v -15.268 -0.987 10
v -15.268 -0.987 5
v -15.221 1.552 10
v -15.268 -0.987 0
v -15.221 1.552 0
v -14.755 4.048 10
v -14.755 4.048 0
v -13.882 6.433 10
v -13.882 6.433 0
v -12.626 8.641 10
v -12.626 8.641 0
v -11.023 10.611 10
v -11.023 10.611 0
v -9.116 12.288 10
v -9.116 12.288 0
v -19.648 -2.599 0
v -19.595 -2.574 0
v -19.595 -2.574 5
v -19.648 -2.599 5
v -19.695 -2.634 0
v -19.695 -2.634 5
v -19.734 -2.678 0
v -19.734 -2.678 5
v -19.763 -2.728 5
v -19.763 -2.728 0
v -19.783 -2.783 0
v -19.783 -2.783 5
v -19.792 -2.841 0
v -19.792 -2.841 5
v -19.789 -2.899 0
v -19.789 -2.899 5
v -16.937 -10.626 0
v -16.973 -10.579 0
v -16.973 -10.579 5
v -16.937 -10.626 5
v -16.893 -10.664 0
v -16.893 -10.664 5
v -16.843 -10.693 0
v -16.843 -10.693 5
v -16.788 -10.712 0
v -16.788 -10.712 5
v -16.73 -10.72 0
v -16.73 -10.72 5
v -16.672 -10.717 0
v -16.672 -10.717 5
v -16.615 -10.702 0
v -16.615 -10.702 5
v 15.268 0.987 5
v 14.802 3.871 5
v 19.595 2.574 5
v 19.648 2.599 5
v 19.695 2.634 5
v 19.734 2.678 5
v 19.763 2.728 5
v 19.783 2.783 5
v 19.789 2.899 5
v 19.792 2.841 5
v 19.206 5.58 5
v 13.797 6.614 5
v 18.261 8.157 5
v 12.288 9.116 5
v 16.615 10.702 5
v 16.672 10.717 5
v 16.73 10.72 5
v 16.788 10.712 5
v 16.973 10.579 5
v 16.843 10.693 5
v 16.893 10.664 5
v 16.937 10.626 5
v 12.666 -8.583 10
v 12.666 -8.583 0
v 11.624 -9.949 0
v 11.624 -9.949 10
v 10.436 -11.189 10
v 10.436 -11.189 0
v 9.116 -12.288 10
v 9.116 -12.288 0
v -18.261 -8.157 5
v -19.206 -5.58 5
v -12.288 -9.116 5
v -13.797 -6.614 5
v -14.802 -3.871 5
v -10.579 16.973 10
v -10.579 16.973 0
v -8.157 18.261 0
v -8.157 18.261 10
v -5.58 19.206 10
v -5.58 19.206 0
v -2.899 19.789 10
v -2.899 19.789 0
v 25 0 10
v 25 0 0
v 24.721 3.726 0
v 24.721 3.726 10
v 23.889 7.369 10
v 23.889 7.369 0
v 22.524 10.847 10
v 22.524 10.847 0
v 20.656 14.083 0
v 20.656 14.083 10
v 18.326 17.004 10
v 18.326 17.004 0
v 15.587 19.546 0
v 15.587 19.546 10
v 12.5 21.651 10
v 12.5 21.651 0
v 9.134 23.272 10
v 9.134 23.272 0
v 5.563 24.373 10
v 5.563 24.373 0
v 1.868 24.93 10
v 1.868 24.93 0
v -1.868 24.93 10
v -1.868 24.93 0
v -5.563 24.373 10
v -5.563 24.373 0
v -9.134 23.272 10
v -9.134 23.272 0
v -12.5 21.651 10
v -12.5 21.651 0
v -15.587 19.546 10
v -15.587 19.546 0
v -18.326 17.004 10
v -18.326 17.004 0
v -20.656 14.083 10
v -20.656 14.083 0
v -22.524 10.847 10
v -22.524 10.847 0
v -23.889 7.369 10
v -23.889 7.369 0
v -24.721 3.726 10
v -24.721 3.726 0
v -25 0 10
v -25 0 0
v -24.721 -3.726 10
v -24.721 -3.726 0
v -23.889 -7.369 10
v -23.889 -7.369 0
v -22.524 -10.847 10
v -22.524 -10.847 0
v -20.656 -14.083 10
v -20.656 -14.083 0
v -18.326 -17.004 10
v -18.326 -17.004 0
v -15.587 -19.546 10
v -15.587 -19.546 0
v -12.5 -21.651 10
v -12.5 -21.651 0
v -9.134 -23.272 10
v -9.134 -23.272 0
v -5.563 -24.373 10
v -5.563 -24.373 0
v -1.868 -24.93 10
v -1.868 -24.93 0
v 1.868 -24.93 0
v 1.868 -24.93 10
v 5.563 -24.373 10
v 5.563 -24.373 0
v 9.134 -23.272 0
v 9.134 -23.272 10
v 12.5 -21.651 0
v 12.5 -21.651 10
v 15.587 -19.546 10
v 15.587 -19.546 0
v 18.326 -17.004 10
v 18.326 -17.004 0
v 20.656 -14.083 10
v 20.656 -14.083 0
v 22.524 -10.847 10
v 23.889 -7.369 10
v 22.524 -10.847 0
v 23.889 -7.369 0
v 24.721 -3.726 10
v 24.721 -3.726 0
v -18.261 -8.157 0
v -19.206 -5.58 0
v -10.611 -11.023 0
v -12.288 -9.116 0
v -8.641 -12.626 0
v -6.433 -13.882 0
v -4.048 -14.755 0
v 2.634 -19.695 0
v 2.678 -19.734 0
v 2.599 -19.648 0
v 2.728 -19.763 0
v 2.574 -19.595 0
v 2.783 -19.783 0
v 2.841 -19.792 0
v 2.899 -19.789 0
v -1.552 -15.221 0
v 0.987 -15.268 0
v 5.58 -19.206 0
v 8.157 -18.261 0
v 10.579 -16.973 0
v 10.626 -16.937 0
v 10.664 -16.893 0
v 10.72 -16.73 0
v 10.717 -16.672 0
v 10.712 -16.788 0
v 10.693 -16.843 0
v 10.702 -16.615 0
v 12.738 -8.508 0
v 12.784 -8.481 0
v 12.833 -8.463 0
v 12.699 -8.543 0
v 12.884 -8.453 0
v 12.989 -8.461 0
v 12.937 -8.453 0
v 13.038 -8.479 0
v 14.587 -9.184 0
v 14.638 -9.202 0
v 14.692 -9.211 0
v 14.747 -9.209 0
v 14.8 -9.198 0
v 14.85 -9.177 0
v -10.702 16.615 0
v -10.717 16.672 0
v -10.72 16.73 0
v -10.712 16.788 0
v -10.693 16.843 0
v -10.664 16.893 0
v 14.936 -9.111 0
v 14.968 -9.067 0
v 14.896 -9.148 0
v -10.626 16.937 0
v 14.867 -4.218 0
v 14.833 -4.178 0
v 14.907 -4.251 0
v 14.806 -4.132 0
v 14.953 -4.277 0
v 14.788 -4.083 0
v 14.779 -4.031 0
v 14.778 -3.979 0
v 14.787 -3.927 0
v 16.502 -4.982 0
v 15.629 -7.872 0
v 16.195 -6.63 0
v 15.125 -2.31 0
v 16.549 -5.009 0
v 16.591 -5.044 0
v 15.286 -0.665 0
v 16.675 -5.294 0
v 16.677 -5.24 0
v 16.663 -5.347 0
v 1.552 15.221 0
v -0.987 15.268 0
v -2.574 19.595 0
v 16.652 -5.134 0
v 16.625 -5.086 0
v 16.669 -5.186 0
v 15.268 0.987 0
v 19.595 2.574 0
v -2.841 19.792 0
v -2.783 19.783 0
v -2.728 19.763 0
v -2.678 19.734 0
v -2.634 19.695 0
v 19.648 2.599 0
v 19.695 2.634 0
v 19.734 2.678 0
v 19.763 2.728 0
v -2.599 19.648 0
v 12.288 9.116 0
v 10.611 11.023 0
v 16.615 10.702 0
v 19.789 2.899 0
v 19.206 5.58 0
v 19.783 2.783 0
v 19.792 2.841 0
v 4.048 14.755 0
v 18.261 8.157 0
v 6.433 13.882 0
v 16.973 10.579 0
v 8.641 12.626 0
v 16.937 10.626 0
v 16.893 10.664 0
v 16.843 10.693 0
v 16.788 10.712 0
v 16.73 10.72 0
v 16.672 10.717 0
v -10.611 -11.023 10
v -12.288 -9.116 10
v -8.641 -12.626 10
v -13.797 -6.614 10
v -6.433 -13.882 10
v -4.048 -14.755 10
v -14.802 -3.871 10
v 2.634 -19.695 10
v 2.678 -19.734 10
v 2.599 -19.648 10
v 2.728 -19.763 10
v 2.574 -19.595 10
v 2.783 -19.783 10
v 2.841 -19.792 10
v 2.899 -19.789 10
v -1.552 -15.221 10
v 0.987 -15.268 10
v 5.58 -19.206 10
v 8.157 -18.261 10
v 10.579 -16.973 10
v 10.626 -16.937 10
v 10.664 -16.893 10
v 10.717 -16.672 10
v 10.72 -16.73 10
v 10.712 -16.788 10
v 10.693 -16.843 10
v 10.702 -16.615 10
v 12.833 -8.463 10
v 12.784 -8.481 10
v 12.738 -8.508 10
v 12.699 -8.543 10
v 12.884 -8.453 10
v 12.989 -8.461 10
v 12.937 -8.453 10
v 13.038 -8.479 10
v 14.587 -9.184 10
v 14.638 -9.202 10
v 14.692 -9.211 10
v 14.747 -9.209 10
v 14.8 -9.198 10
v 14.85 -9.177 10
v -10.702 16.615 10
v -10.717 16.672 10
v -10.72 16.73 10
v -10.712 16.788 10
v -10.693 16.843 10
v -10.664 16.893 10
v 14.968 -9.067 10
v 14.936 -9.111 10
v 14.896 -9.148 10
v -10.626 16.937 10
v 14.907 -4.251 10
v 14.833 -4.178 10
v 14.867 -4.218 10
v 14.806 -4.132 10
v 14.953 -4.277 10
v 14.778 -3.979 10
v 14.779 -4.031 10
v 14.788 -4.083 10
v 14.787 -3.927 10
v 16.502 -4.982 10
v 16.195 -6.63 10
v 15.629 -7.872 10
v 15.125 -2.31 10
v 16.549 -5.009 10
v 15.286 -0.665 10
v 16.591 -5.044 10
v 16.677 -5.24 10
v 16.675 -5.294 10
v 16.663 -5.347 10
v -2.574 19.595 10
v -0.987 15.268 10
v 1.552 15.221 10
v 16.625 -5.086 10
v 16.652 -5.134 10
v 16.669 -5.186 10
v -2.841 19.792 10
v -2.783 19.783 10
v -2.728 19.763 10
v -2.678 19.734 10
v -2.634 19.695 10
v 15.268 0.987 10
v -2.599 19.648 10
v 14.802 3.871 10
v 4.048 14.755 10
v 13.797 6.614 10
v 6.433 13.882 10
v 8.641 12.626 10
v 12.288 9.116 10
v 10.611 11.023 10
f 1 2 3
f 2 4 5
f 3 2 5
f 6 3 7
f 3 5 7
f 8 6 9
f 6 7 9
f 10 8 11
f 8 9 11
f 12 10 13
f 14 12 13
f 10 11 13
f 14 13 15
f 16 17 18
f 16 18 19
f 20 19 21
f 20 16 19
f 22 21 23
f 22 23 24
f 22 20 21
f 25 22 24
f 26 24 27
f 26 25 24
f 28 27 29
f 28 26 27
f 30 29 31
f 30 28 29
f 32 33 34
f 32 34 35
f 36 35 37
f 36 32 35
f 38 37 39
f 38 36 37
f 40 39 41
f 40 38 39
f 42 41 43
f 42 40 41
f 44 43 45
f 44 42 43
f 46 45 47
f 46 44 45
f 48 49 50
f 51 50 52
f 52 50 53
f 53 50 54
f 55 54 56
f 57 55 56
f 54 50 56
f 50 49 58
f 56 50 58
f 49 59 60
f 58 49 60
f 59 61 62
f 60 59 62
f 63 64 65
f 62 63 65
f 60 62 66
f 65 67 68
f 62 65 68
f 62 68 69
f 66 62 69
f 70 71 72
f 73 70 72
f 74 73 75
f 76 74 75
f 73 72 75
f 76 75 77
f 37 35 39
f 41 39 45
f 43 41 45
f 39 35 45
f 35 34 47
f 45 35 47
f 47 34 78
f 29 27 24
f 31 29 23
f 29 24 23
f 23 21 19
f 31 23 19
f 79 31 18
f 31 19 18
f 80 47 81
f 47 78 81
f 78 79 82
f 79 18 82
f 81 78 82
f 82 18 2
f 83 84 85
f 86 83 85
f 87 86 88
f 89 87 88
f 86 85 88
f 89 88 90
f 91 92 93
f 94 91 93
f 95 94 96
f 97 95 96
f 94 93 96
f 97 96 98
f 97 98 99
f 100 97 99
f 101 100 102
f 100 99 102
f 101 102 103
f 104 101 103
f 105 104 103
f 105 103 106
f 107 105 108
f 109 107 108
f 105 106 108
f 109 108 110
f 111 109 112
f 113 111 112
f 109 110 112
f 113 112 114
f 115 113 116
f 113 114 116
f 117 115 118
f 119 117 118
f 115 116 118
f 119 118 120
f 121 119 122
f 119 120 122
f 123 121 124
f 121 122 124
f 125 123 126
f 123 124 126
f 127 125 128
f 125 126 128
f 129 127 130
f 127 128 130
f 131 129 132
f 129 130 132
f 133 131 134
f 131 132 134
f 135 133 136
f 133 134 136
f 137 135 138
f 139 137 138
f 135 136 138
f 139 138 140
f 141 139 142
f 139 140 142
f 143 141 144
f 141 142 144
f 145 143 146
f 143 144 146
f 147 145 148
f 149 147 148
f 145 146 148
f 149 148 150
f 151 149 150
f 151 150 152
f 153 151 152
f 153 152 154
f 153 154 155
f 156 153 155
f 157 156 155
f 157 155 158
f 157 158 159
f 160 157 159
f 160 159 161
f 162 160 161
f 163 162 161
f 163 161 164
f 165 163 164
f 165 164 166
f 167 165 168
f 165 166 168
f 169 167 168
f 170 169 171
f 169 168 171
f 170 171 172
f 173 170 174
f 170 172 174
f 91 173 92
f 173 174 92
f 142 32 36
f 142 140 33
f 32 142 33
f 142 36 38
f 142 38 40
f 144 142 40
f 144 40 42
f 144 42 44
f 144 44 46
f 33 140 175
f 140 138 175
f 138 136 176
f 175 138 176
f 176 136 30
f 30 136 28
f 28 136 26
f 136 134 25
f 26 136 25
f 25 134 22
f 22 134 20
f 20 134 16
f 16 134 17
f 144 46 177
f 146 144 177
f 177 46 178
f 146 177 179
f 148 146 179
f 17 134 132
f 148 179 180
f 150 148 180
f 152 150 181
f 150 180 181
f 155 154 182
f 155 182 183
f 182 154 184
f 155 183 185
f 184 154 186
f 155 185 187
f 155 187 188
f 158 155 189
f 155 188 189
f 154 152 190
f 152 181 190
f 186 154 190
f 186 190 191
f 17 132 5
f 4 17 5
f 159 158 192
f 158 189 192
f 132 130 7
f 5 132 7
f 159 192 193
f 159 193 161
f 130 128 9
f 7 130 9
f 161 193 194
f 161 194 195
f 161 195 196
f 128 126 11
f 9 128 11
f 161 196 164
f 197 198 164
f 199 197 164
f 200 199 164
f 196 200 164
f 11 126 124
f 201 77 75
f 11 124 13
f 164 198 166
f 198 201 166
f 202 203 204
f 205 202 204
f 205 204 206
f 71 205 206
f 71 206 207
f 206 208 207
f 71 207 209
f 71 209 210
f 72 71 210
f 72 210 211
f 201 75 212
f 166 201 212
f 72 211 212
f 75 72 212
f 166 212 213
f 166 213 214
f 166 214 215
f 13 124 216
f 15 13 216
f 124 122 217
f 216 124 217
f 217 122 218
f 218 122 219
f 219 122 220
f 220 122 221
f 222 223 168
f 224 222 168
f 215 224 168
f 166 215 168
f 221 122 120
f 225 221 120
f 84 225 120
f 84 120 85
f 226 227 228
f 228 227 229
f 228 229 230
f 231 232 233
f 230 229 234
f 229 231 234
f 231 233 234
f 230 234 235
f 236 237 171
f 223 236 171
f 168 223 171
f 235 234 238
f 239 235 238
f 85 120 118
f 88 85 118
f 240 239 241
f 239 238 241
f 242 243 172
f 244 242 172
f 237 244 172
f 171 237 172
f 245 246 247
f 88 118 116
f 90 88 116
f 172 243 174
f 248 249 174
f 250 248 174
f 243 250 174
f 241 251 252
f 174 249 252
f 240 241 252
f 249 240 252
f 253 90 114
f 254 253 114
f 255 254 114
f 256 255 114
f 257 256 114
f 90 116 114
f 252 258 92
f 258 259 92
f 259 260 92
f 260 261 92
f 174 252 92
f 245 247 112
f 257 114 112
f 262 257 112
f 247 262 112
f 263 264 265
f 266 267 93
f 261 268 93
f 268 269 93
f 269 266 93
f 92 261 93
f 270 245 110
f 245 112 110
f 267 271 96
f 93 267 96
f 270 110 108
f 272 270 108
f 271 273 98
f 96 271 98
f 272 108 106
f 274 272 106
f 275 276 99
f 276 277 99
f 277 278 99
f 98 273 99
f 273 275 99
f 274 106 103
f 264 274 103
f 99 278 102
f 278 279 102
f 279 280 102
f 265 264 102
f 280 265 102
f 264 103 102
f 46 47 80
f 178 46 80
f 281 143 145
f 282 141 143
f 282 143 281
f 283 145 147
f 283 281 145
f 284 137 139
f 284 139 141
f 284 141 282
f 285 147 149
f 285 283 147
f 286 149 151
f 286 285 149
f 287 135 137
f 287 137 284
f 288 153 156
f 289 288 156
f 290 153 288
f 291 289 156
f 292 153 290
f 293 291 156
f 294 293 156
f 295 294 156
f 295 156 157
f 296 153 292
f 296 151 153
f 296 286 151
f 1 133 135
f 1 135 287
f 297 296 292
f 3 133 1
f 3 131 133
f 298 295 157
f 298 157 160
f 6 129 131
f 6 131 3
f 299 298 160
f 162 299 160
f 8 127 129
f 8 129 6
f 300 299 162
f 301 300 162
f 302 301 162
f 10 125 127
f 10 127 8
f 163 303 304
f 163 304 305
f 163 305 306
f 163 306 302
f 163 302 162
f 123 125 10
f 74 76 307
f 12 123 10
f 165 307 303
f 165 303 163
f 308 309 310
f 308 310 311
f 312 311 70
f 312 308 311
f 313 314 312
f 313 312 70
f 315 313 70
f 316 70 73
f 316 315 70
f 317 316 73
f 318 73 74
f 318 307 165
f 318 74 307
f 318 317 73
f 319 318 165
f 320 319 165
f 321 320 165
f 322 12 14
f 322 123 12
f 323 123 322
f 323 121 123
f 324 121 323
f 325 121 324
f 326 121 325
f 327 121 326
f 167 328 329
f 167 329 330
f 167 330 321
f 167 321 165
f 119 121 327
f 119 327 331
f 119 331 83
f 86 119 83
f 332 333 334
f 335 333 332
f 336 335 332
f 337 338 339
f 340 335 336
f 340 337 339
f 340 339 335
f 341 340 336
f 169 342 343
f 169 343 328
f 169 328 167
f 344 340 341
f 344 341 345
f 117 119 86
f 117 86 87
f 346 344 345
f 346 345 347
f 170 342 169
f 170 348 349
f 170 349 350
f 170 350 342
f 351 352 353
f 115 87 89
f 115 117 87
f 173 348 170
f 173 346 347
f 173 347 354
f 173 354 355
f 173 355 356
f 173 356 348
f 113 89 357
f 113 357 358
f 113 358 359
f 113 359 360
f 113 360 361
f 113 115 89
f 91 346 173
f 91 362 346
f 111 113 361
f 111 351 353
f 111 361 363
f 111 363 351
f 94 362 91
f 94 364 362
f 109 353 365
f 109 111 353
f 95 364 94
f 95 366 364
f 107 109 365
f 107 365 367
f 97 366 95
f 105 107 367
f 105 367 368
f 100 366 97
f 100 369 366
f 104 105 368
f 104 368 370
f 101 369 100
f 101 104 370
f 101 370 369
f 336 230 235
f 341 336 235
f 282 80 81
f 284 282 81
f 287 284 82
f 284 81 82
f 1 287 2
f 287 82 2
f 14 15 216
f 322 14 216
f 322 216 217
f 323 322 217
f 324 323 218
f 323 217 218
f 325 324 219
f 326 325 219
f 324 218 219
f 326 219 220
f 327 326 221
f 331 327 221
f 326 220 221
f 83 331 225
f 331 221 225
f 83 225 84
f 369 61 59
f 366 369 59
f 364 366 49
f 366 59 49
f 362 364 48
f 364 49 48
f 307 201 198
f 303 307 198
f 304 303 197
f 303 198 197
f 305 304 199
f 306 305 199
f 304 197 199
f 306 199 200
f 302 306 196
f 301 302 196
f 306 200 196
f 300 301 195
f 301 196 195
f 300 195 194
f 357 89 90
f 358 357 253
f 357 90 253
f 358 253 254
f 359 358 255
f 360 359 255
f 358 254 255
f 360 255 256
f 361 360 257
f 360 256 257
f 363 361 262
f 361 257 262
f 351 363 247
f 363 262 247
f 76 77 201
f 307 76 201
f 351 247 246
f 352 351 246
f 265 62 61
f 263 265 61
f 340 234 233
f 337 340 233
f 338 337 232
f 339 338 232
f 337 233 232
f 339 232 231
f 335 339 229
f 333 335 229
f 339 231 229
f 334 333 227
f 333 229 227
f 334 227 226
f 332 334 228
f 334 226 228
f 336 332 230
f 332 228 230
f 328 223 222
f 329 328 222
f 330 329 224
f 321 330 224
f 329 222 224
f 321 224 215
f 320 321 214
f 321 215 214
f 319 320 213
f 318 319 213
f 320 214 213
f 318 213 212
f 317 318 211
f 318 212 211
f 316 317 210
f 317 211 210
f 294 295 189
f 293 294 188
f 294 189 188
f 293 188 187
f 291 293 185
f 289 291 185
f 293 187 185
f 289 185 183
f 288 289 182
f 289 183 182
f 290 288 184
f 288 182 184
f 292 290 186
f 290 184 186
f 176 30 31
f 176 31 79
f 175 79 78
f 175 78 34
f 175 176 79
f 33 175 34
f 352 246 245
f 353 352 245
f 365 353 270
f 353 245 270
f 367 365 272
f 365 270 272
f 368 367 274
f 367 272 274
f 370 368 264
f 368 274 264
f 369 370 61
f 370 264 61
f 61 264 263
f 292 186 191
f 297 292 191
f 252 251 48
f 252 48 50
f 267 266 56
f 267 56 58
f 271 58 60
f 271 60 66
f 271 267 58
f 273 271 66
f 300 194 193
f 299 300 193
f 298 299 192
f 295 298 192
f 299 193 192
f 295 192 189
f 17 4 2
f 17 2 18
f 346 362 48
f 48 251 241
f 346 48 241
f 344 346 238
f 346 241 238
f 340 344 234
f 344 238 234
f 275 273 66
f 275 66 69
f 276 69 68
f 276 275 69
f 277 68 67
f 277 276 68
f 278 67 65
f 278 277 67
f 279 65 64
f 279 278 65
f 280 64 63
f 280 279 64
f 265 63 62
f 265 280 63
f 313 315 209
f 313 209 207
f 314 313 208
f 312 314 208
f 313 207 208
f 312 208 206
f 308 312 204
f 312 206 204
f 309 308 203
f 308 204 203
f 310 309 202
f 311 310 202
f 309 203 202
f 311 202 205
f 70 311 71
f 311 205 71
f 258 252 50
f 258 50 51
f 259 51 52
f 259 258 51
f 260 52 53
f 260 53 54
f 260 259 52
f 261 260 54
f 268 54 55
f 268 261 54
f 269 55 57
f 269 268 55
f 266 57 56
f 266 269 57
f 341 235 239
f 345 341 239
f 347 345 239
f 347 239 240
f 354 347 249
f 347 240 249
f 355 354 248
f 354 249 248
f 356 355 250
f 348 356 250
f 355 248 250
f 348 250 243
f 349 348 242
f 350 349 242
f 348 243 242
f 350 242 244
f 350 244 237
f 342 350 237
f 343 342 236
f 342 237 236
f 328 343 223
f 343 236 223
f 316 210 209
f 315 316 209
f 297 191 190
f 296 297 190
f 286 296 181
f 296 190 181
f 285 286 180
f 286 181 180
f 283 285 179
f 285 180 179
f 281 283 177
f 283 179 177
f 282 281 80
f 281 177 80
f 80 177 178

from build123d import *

# Parameters (mm, degrees)
ESQUISSE1_R             = 25
BOSS_EXTRU_1_DEPTH      = 10
ENL_V_MAT_EXTRU_1_DEPTH = 5


with BuildPart() as part:
    # Esquisse1 → Boss.-Extru.1 (new body)
    with BuildSketch(Plane.XY):
        Circle(ESQUISSE1_R)
        with BuildLine():
            ThreePointArc((14.787409001, -3.927153556), (14.806182583, -4.132467854), (14.953030626, -4.277181575))
            Line((14.953030626, -4.277181575), (16.501758042, -4.982426557))
            ThreePointArc((16.501758042, -4.982426557), (16.651785463, -5.134087079), (16.663083329, -5.347116418))
            ThreePointArc((16.663083329, -5.347116418), (15.924531384, -7.256672806), (14.968008895, -9.066901881))
            ThreePointArc((14.968008895, -9.066901881), (14.799864591, -9.198133844), (14.587009397, -9.184458985))
            Line((14.587009397, -9.184458985), (13.038282108, -8.478683252))
            ThreePointArc((13.038282108, -8.478683252), (12.832759155, -8.462847948), (12.665533258, -8.583371557))
            ThreePointArc((12.665533258, -8.583371557), (11.047050831, -10.585493278), (9.115784449, -12.28789949))
            Line((9.115784449, -12.28789949), (10.702270918, -16.615013469))
            ThreePointArc((10.702270918, -16.615013469), (10.704320991, -16.815778994), (10.57929488, -16.972876004))
            ThreePointArc((10.57929488, -16.972876004), (6.884626339, -18.777697414), (2.898945402, -19.788787622))
            ThreePointArc((2.898945402, -19.788787622), (2.70200379, -19.749736367), (2.57379576, -19.595225203))
            Line((2.57379576, -19.595225203), (0.987309291, -15.268111225))
            ThreePointArc((0.987309291, -15.268111225), (-14.364938522, -5.26673915), (-9.115784449, 12.28789949))
            Line((-9.115784449, 12.28789949), (-10.702270918, 16.615013469))
            ThreePointArc((-10.702270918, 16.615013469), (-10.704320991, 16.815778994), (-10.57929488, 16.972876004))
            ThreePointArc((-10.57929488, 16.972876004), (-6.884626339, 18.777697414), (-2.898945402, 19.788787622))
            ThreePointArc((-2.898945402, 19.788787622), (-2.70200379, 19.749736367), (-2.57379576, 19.595225203))
            Line((-2.57379576, 19.595225203), (-0.987309291, 15.268111225))
            ThreePointArc((-0.987309291, 15.268111225), (11.820542944, 9.714152794), (14.787409001, -3.927153556))
        make_face(mode=Mode.SUBTRACT)
    extrude(amount=BOSS_EXTRU_1_DEPTH)

    # Esquisse1<6> → Enlèv. mat.-Extru.1 (cut)
    with BuildSketch(Plane.XY):
        with BuildLine():
            ThreePointArc((12.28789949, 9.115784449), (14.364938522, 5.26673915), (15.268111225, 0.987309291))
            Line((15.268111225, 0.987309291), (19.595225203, 2.57379576))
            ThreePointArc((19.595225203, 2.57379576), (19.749736367, 2.70200379), (19.788787622, 2.898945402))
            ThreePointArc((19.788787622, 2.898945402), (18.777697414, 6.884626339), (16.972876004, 10.57929488))
            ThreePointArc((16.972876004, 10.57929488), (16.815778994, 10.704320991), (16.615013469, 10.702270918))
            Line((16.615013469, 10.702270918), (12.28789949, 9.115784449))
        make_face()
        with BuildLine():
            ThreePointArc((-12.28789949, -9.115784449), (-14.364938522, -5.26673915), (-15.268111225, -0.987309291))
            Line((-15.268111225, -0.987309291), (-19.595225203, -2.57379576))
            ThreePointArc((-19.595225203, -2.57379576), (-19.749736367, -2.70200379), (-19.788787622, -2.898945402))
            ThreePointArc((-19.788787622, -2.898945402), (-18.777697414, -6.884626339), (-16.972876004, -10.57929488))
            ThreePointArc((-16.972876004, -10.57929488), (-16.815778994, -10.704320991), (-16.615013469, -10.702270918))
            Line((-16.615013469, -10.702270918), (-12.28789949, -9.115784449))
        make_face()
    extrude(amount=ENL_V_MAT_EXTRU_1_DEPTH, mode=Mode.SUBTRACT)


solid = part.part
